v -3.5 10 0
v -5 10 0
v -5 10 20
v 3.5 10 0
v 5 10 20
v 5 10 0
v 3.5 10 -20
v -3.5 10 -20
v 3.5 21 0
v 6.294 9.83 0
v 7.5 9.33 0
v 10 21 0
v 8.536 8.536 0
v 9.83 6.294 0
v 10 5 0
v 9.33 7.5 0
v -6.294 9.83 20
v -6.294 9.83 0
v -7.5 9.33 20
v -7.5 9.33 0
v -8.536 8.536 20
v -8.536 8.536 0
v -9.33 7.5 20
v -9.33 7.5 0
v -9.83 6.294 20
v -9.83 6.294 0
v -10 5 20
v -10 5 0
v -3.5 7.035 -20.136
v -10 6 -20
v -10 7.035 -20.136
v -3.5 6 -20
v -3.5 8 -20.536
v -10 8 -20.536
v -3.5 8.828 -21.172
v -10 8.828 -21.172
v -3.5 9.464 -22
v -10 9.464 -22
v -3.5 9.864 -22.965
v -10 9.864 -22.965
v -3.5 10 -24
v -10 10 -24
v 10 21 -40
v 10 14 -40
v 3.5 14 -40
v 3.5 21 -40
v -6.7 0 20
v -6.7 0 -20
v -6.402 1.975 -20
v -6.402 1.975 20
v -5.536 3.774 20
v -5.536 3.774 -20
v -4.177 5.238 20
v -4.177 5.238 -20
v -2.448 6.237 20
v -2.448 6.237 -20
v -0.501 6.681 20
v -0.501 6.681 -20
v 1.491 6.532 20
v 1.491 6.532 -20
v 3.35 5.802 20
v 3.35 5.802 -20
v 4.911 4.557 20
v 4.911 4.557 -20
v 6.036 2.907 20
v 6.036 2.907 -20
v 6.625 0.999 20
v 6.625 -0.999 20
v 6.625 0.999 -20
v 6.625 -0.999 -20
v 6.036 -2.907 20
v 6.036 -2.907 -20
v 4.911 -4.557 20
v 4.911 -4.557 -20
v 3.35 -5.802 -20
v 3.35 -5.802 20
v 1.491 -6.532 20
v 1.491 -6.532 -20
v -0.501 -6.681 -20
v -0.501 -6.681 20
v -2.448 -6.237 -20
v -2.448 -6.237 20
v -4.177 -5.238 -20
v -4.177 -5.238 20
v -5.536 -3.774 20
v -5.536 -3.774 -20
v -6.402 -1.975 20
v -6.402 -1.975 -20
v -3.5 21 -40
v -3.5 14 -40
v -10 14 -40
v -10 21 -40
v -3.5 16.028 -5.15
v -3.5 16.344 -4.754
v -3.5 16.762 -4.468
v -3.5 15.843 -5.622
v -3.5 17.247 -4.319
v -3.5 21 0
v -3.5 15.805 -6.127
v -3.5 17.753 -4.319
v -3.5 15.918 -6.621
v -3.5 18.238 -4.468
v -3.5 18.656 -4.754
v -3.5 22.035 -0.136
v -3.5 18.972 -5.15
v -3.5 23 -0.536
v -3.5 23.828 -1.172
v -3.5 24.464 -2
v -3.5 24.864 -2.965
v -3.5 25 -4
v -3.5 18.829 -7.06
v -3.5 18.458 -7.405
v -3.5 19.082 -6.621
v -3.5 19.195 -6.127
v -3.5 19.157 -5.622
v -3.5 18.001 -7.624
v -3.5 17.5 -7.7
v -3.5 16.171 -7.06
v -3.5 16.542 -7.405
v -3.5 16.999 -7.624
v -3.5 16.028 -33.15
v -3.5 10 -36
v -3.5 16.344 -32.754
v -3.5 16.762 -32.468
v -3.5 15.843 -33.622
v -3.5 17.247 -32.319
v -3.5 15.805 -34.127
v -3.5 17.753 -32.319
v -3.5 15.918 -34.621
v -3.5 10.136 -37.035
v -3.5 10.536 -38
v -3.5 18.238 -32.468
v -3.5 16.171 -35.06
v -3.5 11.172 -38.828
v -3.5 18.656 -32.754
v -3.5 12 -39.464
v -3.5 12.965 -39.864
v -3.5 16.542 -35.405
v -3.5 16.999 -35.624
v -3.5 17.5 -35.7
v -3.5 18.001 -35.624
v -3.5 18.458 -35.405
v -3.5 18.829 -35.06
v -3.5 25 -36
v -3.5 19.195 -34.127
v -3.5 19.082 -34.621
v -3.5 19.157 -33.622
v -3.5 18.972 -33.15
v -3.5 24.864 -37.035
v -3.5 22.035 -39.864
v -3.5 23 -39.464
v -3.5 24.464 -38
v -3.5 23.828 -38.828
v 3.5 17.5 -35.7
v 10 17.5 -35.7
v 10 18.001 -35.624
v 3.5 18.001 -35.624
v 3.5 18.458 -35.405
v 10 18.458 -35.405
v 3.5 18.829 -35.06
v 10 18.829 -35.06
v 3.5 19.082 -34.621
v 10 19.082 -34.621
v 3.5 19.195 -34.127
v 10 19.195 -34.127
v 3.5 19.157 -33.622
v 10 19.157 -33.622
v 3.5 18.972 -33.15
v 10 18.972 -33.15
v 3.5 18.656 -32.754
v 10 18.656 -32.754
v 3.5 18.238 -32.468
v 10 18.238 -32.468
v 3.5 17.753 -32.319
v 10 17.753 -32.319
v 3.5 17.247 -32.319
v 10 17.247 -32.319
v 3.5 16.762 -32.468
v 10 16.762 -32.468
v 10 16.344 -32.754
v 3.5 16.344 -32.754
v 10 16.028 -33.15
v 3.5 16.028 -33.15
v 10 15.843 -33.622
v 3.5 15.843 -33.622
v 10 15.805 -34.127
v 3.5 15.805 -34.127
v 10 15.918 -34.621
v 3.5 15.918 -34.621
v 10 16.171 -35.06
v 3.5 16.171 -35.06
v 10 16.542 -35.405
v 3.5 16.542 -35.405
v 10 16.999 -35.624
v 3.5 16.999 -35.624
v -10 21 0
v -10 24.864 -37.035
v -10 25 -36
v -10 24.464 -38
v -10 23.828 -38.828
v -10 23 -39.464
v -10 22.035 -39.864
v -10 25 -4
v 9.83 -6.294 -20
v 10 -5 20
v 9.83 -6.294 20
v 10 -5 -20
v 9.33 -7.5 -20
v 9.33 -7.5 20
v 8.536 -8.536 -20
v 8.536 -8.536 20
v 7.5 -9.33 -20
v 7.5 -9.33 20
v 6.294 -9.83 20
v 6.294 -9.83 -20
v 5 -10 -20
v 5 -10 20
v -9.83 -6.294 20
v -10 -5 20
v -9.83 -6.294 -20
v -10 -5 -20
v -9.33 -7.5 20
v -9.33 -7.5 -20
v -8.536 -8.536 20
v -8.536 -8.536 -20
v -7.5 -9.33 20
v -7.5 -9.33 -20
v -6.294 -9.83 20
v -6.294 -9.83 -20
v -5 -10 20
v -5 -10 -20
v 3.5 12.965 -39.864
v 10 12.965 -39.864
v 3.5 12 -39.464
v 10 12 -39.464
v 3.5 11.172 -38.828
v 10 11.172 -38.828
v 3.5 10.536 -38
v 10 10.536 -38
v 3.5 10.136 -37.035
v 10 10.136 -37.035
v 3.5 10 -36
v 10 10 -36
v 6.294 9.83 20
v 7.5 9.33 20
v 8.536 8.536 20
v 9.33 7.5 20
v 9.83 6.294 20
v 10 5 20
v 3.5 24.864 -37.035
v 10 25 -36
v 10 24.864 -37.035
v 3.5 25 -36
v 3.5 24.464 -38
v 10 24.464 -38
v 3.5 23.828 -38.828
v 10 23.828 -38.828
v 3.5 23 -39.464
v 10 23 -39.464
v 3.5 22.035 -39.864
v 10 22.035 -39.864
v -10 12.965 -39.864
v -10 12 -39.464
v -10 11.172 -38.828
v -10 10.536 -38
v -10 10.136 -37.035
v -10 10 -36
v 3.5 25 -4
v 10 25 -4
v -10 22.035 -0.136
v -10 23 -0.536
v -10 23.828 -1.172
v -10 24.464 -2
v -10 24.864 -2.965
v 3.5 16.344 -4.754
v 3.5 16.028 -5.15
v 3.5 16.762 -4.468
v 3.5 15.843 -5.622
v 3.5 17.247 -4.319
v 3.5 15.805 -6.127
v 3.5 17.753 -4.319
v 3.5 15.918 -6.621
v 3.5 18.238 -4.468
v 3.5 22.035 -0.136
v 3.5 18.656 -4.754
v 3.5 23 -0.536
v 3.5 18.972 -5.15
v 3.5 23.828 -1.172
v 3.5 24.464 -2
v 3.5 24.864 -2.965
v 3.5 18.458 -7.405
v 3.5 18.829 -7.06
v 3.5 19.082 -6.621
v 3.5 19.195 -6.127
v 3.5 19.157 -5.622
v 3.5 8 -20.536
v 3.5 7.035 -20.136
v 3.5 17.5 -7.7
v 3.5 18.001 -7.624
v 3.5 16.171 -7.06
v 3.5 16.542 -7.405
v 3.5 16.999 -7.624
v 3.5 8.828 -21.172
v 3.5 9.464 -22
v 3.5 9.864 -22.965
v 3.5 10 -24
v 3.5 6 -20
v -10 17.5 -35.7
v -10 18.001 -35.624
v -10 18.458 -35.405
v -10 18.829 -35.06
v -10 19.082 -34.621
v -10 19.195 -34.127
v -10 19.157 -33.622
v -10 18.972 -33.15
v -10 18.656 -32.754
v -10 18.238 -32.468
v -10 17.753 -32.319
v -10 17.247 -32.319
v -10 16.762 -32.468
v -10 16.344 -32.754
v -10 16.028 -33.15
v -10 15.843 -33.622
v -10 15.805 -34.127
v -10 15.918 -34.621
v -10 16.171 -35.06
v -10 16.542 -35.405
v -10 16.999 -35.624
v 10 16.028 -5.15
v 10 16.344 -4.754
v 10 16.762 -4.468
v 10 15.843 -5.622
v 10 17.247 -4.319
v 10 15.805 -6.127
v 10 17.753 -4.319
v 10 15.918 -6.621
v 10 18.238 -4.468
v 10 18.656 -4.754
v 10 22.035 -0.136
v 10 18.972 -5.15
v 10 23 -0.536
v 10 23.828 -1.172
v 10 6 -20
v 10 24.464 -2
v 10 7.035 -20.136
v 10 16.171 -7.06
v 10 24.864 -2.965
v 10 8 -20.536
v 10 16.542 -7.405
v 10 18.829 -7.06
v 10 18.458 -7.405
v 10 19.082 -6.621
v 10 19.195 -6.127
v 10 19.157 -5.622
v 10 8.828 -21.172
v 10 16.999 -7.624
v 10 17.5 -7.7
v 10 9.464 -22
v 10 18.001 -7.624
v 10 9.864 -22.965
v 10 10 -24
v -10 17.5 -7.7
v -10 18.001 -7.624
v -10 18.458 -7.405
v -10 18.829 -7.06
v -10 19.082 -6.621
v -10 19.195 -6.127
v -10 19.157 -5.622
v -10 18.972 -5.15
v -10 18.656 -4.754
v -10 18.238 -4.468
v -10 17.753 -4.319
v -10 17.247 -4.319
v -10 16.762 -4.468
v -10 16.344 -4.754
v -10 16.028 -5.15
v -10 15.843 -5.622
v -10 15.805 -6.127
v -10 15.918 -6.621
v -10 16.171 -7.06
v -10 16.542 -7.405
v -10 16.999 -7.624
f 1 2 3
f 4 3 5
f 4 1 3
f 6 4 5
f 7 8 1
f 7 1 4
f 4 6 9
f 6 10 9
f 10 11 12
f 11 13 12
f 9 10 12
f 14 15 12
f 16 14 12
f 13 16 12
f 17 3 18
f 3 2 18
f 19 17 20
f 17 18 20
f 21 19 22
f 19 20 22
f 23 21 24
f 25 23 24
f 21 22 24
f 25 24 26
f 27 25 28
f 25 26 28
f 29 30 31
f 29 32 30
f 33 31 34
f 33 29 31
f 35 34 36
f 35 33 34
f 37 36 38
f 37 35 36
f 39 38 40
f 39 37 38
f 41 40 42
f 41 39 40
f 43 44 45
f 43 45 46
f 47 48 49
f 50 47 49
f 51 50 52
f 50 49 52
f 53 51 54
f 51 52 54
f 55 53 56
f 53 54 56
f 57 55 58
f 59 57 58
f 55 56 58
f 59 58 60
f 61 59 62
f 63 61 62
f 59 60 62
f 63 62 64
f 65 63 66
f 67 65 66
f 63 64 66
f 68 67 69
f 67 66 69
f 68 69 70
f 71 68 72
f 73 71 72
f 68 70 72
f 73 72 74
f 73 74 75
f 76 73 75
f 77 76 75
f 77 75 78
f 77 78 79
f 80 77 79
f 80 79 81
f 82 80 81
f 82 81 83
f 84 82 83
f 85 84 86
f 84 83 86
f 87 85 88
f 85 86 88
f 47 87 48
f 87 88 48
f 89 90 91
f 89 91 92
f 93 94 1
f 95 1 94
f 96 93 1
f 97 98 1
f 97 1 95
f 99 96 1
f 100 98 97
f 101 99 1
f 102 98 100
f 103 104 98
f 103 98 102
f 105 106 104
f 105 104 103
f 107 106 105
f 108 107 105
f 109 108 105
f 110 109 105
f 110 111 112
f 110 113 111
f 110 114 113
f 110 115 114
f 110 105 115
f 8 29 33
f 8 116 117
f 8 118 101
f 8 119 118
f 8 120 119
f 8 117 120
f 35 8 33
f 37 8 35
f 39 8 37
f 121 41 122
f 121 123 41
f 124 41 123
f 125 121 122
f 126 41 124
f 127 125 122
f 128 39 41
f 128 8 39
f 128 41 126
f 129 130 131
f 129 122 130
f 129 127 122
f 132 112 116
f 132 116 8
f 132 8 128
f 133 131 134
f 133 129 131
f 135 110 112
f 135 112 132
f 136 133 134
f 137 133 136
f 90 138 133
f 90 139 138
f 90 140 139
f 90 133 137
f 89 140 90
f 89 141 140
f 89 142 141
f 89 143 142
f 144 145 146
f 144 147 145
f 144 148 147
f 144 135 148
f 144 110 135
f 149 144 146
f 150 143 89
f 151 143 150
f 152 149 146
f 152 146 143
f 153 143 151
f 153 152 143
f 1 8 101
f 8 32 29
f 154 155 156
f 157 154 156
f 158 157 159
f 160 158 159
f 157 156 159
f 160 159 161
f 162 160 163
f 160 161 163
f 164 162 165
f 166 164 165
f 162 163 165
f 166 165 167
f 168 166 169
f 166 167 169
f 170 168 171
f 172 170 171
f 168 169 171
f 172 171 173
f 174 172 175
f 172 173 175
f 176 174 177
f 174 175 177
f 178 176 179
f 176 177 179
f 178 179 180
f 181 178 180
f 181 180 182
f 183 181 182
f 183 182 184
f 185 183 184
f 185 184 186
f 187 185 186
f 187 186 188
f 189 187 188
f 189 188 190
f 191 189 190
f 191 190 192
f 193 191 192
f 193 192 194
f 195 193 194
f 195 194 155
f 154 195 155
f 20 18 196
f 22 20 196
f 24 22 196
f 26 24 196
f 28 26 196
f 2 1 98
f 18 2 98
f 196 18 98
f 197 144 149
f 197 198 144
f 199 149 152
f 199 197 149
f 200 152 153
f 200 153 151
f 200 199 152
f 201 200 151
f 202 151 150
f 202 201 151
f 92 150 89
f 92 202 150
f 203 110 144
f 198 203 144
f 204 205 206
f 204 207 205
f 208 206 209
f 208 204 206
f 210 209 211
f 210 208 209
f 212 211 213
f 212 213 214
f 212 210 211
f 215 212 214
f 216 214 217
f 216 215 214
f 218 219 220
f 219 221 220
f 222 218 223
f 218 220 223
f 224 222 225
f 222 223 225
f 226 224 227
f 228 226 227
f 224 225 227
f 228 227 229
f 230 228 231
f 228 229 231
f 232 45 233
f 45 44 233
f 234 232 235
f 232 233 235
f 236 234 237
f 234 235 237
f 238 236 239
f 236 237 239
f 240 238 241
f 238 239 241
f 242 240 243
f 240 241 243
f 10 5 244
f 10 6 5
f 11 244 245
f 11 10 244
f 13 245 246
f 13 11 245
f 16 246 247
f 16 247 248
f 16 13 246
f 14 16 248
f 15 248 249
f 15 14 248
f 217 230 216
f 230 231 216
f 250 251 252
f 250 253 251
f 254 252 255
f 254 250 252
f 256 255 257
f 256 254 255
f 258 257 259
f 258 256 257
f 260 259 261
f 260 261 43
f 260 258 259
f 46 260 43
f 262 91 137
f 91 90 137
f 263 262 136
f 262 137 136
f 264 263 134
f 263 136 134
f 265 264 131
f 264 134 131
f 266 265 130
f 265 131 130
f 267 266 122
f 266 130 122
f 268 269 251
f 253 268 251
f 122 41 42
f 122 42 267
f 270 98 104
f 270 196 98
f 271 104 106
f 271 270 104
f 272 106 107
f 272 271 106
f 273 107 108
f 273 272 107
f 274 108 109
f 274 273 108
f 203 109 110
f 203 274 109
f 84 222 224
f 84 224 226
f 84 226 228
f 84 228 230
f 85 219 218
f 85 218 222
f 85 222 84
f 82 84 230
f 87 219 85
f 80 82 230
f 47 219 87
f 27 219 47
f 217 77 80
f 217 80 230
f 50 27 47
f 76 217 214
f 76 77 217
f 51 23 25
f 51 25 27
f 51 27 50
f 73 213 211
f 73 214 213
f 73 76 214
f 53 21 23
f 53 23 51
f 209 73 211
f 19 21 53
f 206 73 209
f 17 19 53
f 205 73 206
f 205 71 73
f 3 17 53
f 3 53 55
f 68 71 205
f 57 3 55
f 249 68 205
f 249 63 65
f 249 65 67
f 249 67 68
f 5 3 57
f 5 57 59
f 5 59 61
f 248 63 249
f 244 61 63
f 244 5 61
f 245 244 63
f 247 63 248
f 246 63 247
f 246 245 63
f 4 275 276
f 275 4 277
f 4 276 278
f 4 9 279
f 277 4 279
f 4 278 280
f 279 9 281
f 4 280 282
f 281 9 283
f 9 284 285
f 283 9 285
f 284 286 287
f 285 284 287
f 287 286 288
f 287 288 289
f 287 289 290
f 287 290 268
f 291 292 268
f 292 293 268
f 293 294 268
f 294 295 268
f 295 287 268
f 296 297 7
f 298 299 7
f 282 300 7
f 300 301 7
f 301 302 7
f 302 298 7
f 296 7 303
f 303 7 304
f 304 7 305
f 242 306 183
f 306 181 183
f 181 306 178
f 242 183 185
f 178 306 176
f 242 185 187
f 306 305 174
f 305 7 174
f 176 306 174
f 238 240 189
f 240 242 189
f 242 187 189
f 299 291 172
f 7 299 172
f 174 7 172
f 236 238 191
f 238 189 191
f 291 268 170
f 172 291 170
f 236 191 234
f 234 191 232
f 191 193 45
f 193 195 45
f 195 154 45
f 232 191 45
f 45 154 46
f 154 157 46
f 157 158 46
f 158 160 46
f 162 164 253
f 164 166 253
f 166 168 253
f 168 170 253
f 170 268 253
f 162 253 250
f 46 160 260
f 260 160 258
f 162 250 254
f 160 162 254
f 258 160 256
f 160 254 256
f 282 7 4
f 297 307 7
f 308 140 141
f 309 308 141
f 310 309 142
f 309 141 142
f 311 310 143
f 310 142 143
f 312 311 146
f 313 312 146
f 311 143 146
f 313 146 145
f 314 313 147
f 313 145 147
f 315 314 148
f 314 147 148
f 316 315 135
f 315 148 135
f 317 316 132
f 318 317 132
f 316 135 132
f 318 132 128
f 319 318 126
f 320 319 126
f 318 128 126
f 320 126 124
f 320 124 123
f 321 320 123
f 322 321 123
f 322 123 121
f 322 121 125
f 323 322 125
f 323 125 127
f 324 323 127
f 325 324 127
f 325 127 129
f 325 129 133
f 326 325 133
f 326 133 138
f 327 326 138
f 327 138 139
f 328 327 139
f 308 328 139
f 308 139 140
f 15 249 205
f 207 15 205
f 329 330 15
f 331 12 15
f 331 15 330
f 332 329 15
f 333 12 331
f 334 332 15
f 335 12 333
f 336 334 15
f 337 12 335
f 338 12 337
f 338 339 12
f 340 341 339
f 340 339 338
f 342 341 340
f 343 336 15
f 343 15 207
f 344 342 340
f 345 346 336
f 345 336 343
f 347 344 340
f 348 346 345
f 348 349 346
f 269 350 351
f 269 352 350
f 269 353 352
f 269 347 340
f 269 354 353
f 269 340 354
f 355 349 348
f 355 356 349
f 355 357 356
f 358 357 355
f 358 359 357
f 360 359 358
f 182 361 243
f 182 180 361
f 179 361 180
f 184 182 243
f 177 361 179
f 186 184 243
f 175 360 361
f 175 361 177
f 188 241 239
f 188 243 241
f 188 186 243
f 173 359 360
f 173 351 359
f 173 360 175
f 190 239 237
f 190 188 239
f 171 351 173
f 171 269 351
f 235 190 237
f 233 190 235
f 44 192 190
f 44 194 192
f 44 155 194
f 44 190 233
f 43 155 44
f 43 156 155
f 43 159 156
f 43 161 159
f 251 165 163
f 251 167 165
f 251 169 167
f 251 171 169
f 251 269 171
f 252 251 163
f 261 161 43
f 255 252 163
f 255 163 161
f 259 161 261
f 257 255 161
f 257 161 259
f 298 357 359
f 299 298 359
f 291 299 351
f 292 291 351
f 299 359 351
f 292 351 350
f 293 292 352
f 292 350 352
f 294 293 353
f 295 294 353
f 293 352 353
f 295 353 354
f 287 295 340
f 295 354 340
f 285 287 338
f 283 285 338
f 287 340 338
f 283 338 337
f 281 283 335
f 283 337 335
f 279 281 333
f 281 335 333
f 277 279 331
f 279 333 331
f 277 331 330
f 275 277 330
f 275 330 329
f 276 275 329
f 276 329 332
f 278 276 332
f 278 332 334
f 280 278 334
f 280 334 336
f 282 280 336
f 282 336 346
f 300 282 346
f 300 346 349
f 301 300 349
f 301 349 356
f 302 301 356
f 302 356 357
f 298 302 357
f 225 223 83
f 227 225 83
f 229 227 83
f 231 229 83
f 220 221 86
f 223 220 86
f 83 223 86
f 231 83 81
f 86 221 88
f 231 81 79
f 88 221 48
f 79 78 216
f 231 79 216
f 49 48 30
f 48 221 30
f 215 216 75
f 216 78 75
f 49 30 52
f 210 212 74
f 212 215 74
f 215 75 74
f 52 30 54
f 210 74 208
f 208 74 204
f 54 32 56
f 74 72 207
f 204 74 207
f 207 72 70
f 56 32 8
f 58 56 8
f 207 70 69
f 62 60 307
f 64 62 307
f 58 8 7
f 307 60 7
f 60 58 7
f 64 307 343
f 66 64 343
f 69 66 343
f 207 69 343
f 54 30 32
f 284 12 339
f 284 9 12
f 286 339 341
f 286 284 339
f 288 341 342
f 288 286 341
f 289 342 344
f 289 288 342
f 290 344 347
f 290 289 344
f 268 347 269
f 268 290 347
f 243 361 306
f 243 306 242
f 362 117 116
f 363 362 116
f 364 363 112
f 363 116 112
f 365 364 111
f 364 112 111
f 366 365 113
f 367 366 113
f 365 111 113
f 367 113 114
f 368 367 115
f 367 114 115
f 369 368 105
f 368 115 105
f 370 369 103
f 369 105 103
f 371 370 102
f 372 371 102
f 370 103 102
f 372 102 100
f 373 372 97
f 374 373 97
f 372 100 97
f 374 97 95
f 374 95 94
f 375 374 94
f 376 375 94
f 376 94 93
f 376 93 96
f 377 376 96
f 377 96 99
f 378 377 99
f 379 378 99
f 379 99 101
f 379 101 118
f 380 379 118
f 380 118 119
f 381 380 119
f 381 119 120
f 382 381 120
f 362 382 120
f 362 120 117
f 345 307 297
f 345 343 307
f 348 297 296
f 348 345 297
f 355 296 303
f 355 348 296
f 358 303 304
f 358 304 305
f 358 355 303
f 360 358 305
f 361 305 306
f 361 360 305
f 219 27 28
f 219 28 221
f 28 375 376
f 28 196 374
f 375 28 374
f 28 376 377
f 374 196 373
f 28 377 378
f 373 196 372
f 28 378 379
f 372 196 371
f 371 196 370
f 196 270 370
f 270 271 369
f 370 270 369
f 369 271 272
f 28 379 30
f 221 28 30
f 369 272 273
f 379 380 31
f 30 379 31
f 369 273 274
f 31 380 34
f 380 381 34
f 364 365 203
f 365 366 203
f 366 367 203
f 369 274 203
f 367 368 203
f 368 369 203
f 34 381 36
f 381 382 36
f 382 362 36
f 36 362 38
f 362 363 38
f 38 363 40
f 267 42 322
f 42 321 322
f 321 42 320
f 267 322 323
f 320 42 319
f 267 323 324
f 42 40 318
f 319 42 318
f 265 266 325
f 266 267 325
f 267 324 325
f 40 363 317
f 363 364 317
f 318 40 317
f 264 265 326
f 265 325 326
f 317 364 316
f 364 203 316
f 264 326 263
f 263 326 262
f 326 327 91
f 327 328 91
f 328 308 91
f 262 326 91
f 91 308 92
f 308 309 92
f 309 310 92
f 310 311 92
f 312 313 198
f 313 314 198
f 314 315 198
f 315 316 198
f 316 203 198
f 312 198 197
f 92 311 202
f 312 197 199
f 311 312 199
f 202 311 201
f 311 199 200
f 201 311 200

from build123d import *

# Parameters (mm, degrees)
CROQUIS1_W              = 20
CROQUIS1_H              = 40
SALIENTE_EXTRUIR1_DEPTH = 10
CROQUIS5_R              = 6.7
CORTAR_EXTRUIR1_DEPTH   = 40
CROQUIS6_W              = 40
CROQUIS6_H              = 15
SALIENTE_EXTRUIR2_DEPTH = 10
CROQUIS7_W              = 7
CROQUIS7_H              = 40
CORTAR_EXTRUIR2_DEPTH   = 15
CROQUIS8_R              = 1.7
CORTAR_EXTRUIR3_DEPTH   = 20
REDONDEO1_R             = 4
REDONDEO2_R             = 5


with BuildPart() as part:
    # Croquis1 → Saliente-Extruir1 (new body, symmetric)
    with BuildSketch(Plane(origin=(0, 0, 0), x_dir=(1, 0, 0), z_dir=(0, 1, 0))):
        Rectangle(CROQUIS1_W, CROQUIS1_H)
    extrude(amount=SALIENTE_EXTRUIR1_DEPTH, both=True)

    # Croquis5 → Cortar-Extruir1 (cut)
    with BuildSketch(Plane(origin=(0, 0, -20), x_dir=(-1, 0, 0), z_dir=(0, 0, -1))):
        Circle(CROQUIS5_R)
    extrude(amount=-CORTAR_EXTRUIR1_DEPTH, mode=Mode.SUBTRACT)

    # Croquis6 → Saliente-Extruir2 (add, symmetric)
    with BuildSketch(Plane(origin=(0, 0, 0), x_dir=(0, 0, -1), z_dir=(1, 0, 0))):
        with Locations((20, 17.5)):
            Rectangle(CROQUIS6_W, CROQUIS6_H)
    extrude(amount=SALIENTE_EXTRUIR2_DEPTH, both=True)

    # Croquis7 → Cortar-Extruir2 (cut)
    with BuildSketch(Plane(origin=(0, 25, 0), x_dir=(1, 0, 0), z_dir=(0, 1, 0))):
        with Locations((0, 20)):
            Rectangle(CROQUIS7_W, CROQUIS7_H)
    extrude(amount=-CORTAR_EXTRUIR2_DEPTH, mode=Mode.SUBTRACT)

    # Croquis8 → Cortar-Extruir3 (cut)
    with BuildSketch(Plane(origin=(10, 0, 0), x_dir=(0, 0, -1), z_dir=(1, 0, 0))):
        with Locations((6, 17.5)):
            Circle(CROQUIS8_R)
        with Locations((34, 17.5)):
            Circle(CROQUIS8_R)
    extrude(amount=-CORTAR_EXTRUIR3_DEPTH, mode=Mode.SUBTRACT)

    # Redondeo1
    redondeo1_edges = [part.edges().sort_by_distance(p)[0] for p in [
        (6.75, 10, -40),
        (6.75, 25, -40),
        (6.75, 25, 0),
        (-6.75, 25, 0),
        (-6.75, 25, -40),
        (-6.75, 10, -40),
        (-6.75, 10, -20),
        (6.75, 10, -20),
    ]]
    fillet(redondeo1_edges, radius=REDONDEO1_R)

    # Redondeo2
    redondeo2_edges = [part.edges().sort_by_distance(p)[0] for p in [
        (-10, 10, 10),
        (10, 10, 10),
        (-10, -10, 0),
        (10, -10, 0),
    ]]
    fillet(redondeo2_edges, radius=REDONDEO2_R)


solid = part.part
